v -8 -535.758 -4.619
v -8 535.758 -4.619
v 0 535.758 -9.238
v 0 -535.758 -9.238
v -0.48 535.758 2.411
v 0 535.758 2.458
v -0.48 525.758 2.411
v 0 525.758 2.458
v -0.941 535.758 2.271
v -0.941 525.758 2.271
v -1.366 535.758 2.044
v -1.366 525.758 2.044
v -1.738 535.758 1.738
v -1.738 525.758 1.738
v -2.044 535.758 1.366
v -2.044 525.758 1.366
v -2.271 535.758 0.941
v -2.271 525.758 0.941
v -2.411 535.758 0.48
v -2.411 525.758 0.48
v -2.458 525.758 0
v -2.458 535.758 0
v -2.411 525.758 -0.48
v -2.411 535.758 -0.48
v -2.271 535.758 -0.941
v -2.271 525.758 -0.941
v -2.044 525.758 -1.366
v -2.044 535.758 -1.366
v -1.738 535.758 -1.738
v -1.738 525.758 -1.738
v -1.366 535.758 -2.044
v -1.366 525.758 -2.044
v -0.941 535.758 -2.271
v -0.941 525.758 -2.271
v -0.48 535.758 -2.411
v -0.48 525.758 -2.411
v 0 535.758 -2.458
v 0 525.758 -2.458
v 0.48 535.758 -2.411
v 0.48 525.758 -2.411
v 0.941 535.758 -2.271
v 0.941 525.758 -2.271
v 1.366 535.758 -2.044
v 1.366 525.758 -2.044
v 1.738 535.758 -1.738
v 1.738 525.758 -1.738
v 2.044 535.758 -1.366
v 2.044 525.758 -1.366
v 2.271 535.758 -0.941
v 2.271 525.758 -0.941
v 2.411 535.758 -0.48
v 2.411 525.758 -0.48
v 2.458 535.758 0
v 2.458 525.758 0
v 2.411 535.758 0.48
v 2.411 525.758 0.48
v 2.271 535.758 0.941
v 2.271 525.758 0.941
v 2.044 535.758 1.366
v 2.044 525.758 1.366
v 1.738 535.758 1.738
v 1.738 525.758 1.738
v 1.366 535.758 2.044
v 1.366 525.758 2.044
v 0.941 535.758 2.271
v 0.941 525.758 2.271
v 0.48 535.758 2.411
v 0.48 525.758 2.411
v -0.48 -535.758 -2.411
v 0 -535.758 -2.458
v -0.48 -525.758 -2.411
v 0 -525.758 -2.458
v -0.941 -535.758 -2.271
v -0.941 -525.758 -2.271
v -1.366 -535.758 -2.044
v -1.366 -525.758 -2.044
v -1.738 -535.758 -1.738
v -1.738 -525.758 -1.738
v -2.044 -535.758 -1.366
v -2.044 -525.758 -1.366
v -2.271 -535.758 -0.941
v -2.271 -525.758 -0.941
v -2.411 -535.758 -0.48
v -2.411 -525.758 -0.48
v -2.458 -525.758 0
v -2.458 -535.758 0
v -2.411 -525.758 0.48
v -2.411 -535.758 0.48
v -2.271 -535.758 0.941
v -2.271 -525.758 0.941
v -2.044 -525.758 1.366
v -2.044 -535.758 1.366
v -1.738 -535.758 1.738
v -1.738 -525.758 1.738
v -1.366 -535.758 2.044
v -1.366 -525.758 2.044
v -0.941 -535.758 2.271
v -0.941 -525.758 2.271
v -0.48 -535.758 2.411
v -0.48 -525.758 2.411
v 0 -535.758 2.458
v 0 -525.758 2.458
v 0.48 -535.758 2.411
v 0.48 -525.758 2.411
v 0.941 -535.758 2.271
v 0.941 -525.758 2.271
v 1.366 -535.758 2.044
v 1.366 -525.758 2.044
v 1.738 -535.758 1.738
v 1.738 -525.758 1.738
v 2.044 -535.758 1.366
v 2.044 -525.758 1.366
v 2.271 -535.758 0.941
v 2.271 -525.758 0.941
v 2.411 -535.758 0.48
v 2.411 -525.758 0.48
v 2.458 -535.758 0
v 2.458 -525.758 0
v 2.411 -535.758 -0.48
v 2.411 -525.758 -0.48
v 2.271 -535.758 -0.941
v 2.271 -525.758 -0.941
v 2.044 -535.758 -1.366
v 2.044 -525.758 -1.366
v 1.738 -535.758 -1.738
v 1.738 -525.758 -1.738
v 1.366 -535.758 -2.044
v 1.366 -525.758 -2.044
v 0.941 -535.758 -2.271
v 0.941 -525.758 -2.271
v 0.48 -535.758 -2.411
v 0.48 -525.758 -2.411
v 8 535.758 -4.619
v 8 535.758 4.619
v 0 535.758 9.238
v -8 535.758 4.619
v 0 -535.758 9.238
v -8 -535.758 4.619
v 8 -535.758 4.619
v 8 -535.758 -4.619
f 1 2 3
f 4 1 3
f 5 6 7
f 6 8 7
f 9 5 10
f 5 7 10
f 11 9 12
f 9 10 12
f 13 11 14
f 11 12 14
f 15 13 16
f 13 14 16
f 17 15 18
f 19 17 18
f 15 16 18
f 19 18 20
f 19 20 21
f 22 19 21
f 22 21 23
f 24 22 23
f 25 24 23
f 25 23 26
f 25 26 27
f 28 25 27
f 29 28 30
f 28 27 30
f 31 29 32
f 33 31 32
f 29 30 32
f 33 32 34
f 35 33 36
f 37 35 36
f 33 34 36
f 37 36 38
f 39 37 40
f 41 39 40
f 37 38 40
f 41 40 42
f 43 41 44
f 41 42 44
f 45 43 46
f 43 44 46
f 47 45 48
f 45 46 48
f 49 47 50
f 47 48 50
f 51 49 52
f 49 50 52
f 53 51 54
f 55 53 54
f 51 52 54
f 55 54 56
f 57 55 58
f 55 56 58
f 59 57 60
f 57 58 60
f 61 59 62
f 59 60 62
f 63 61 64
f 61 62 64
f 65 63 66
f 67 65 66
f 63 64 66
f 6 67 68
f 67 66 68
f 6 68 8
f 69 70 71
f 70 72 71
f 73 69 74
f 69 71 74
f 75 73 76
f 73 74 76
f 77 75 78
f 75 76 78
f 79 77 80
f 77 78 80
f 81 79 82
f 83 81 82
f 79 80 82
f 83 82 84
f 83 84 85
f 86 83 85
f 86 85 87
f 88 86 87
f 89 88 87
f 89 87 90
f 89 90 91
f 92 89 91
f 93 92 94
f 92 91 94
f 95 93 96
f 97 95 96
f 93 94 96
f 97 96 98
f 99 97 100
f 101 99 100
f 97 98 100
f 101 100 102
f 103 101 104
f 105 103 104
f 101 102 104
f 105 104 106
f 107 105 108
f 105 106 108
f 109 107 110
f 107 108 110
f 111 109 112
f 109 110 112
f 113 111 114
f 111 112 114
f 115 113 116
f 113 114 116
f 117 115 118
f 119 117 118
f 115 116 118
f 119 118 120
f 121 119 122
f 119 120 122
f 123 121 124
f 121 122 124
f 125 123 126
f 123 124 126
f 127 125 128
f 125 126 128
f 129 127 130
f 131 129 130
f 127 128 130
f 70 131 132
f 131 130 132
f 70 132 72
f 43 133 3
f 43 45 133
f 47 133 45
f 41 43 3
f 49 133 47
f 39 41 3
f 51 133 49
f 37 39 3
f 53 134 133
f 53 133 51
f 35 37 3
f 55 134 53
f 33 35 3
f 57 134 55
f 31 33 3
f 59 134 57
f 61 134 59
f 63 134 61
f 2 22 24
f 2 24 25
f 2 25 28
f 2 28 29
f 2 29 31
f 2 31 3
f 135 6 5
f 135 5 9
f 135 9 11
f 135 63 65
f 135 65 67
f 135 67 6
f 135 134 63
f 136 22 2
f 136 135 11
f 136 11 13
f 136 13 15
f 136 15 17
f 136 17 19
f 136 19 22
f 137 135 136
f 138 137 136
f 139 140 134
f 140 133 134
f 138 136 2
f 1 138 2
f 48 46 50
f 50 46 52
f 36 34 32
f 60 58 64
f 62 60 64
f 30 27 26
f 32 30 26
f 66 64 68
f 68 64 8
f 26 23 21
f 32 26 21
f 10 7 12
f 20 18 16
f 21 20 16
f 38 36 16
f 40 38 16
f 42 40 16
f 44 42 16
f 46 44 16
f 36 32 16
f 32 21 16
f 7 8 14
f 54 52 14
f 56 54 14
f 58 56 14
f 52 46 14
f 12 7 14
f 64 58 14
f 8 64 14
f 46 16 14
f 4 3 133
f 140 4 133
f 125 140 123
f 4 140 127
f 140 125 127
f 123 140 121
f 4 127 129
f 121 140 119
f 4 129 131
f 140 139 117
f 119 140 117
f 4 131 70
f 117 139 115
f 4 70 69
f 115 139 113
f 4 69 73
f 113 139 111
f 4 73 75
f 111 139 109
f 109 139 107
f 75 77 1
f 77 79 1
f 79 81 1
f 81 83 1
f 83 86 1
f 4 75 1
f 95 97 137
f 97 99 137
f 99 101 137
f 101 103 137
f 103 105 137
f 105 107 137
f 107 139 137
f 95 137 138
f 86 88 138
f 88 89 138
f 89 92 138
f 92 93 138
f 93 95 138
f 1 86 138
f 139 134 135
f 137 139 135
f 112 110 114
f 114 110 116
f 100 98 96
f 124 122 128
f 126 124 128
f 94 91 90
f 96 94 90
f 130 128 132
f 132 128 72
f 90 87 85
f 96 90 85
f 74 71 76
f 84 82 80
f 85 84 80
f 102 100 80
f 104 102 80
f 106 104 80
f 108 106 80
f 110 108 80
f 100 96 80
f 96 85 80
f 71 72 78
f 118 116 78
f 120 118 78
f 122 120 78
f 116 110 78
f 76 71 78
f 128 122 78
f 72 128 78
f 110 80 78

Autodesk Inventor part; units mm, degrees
ref_plane "YZ Plane" through (0, 0, 0) normal (1, 0, 0) x (0, 1, 0)
ref_plane "XZ Plane" through (0, 0, 0) normal (0, 1, 0) x (-1, 0, 0)
ref_plane "XY Plane" through (0, 0, 0) normal (0, 0, 1) x (1, 0, 0)
sketch "Sketch1" plane through (0, 0, 0) normal (0, 1, 0) x (-1, 0, 0)
  circle A0 centre (0, 0) radius 6.35
  line L0 (0, -9.2376) -> (-8, -4.6188)
  line L1 (-8, -4.6188) -> (-8, 4.6188)
  line L2 (-8, 4.6188) -> (0, 9.2376)
  line L3 (0, 9.2376) -> (8, 4.6188)
  line L4 (8, 4.6188) -> (8, -4.6188)
  line L5 (8, -4.6188) -> (0, -9.2376)
  dimension "d0" = 12.7
  dimension "d3" = 16
extrude "Extrusion1" add sketch "Sketch1" along normal mid plane 1071.516 contours A0 | L0 L1 L2 L3 L4 L5
sketch "Sketch2" plane through (0, 535.758, 0) normal (0, 1, 0) x (1, 0, 0)
  point P0 (0, 0)
  point P1 (0, 0)
hole "Hole1" at (0, 535.758, 0) direction (0, -1, 0) diameter 4.917 depth 10 thread size "M6x1" class "6H" standard "ISO Metric profile"
sketch "Sketch3" plane through (0, -535.758, 0) normal (0, -1, 0) x (1, 0, 0)
  point P0 (0, 0)
  point P1 (0, 0)
hole "Hole2" at (0, -535.758, 0) direction (0, 1, 0) diameter 4.917 depth 10 thread size "M6x1" class "6H" standard "ISO Metric profile"
properties part number "SP17V1 Varilla Pedal"
